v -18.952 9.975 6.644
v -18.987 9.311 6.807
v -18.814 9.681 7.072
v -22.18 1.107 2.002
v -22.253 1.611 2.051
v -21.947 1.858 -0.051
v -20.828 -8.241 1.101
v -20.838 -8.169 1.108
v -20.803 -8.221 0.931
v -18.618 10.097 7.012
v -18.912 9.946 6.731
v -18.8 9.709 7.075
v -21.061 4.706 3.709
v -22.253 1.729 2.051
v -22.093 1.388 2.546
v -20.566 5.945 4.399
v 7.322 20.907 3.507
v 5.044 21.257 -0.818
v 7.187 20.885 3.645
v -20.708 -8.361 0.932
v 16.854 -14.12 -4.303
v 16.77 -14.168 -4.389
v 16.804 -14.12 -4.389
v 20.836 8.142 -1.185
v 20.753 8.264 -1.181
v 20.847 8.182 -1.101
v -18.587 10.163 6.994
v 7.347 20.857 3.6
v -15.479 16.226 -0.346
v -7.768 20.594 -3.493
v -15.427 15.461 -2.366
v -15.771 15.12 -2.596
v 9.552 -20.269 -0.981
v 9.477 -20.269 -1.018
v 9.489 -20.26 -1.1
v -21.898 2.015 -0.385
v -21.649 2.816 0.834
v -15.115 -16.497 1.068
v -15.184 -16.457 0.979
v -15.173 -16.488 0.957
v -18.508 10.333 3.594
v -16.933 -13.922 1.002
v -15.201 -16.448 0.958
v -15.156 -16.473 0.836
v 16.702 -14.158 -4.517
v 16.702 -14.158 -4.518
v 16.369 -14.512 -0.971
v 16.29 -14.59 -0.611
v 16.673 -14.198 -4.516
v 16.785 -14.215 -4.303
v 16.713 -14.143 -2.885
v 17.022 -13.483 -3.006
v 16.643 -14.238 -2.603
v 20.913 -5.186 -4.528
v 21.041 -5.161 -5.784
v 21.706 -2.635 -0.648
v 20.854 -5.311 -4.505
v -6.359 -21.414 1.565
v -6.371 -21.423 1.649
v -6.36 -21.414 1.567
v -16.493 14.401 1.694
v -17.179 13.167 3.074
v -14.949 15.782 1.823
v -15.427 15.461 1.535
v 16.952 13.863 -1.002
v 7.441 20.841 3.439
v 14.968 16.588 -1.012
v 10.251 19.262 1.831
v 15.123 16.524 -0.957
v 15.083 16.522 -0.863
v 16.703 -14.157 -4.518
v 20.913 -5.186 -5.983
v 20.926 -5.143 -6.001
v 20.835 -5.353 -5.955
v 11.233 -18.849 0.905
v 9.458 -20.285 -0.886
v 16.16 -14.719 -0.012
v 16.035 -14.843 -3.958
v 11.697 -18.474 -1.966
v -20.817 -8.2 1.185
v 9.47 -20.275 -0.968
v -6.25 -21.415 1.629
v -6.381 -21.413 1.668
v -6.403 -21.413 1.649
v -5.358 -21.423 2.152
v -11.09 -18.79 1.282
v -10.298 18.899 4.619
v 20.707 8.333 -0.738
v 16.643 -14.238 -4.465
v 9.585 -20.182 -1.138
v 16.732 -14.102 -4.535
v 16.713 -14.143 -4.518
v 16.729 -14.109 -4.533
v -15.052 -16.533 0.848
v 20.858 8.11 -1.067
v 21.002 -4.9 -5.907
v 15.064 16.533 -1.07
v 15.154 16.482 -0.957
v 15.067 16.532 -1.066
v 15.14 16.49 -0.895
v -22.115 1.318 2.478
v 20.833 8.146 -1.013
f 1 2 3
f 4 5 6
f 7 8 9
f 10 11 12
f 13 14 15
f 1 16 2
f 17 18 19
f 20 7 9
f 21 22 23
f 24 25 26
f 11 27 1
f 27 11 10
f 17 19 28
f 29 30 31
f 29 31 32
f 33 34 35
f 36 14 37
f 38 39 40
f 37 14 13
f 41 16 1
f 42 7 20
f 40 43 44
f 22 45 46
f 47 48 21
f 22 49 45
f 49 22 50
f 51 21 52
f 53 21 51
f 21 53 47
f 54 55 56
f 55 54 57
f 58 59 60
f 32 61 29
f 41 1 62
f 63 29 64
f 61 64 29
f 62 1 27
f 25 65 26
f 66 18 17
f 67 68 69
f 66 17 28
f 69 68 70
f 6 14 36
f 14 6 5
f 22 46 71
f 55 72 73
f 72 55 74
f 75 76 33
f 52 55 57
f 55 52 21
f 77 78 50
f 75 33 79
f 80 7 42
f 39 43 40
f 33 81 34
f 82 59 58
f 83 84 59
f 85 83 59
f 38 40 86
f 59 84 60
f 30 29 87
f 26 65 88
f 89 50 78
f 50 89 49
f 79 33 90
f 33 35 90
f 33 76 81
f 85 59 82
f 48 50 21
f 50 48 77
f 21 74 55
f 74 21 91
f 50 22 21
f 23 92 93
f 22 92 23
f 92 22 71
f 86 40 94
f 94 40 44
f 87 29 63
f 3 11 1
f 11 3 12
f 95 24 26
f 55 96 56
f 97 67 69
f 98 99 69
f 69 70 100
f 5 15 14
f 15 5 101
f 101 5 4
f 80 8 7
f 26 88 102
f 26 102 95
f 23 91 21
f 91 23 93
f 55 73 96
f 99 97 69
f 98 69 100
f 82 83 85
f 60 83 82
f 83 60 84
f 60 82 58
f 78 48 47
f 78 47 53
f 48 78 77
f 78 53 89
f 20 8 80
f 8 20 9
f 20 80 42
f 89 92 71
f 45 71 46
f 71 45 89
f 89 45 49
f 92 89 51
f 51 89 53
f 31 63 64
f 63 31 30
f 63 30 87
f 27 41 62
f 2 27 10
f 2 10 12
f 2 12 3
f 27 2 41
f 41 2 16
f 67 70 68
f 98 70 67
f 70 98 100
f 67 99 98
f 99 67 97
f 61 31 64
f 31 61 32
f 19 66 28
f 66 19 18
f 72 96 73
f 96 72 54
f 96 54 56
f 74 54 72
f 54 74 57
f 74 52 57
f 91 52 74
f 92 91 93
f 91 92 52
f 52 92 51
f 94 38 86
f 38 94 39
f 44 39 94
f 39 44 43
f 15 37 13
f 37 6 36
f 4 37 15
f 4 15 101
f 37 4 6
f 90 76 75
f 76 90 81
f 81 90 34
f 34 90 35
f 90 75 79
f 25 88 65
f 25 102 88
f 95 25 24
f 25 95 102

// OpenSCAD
// Auto-generated OpenSCAD file

    inner_points = 10*[[-2.0761541235761705, -0.8104417535921696, 0.13724502428832586], [1.3881323190734756, 1.5113986256831482, 0.8802447594428363], [-1.5147673311324563, -1.6373143484753303, 0.10368044324004255], [1.9495191115171902, 0.6845260307999875, 0.846680178394553], [-1.9495191115171902, -0.6845260307999875, -0.846680178394553], [1.5147673311324563, 1.6373143484753303, -0.10368044324004255], [-1.3881323190734756, -1.5113986256831482, -0.8802447594428363], [2.0761541235761705, 0.8104417535921696, -0.13724502428832586], [-1.5234633524618937, 0.9319192053080169, 1.3403932206570697], [-0.7056562584656506, 1.480031367720886, 1.5157916654178742], [-0.3964274104829382, -0.954186159239866, 1.9795055087654227], [0.4213796835133048, -0.4060739968269973, 2.1549039535262273], [-1.170296744166604, 1.28307982057967, -1.40363089240515], [-0.35248965017036094, 1.831191982992539, -1.2282324476443454], [0.14000710893040944, -0.42079859805616315, -2.1884685345745107], [0.9578142029266525, 0.1273135643567057, -2.013070089813706], [-1.6612573602586815, 1.4143303177258313, 0.47535430243945176], [-0.8434502662624384, 1.9624424801387002, 0.6507527472002564], [-0.6469132683711399, -2.131768469941571, 0.15209993842251773], [1.5346223481997008, -1.5402460405180134, 0.5085709002434271], [-1.5346223481997008, 1.5402460405180134, -0.5085709002434271], [-0.7168152542034577, 2.0883582029308823, -0.3331724554826224], [-0.5202782563121594, -2.005852747149389, -0.8318252642603612], [1.6612573602586815, -1.4143303177258313, -0.47535430243945176], [-2.2142917828860567, 0.0908460622564875, -0.27336216035795285], [0.7445620794331305, 2.073934495513449, 0.3612353743605092], [0.9410990773244287, -2.020276454566821, -0.13741743441722942], [2.2142917828860567, -0.0908460622564875, 0.27336216035795285], [-1.2996082730590448, -0.9452718178121089, 1.550337867868314], [0.8414384952638997, 0.4897044530319842, 2.009536957825971], [-0.8414384952638997, -0.4897044530319842, -2.009536957825971], [1.2996082730590448, 0.9452718178121089, -1.550337867868314], [-0.48214483057590074, 0.02171704803160296, 2.1801680462004573], [0.8497908650802382, -1.6606523973205198, 1.2272559139802832], [0.07592153139657254, 0.5766135824990164, -2.1558804871902892], [1.1813256308164024, -1.3310007553325773, -1.3486937090311228], [-1.9431785126993897, -0.3827359479818073, 1.0313284827859868], [0.7033008359540129, 1.390992268880641, 1.5989297731796923], [-1.0348356016901774, -1.7206439108685836, 0.9770198498317137], [1.6116437469632254, 0.05308430599386482, 1.5446211402254193], [-1.6116437469632254, -0.05308430599386482, -1.5446211402254193], [1.0348356016901774, 1.7206439108685836, -0.9770198498317137], [-0.7033008359540129, -1.390992268880641, -1.5989297731796923], [1.9431785126993897, 0.3827359479818073, -1.0313284827859868], [-1.385325693152007, 0.03063138945936017, 1.7510004053033483], [-0.06208601882530573, 0.9174954978905845, 2.034801050500201], [-0.13165473911407088, -1.7295582522963406, 1.4061874907288225], [1.1915849352126302, -0.8426941438651167, 1.6899881359256754], [-0.9055240727977366, 0.5077077275231954, -1.97694891044175], [0.4177156015289647, 1.3945718359544197, -1.693148265244897], [0.278144768240296, -1.32208641390482, -1.7778613499282319], [1.6013844425669974, -0.43522230547359575, -1.494060704731379], [-2.0813161720092763, 0.5185518678668495, 0.6207212981397079], [0.05973059631366806, 1.9535281387109422, 1.0799203880973653], [0.25626759420496636, -2.140682811369328, 0.5812675793196267], [1.8764164183320928, -0.7222877870626099, 0.9713031221888193], [-1.8764164183320928, 0.7222877870626099, -0.9713031221888193], [0.2646303499908518, 2.1572640579067026, -0.5121040322311619], [0.46116734788214997, -1.9369468921735673, -1.0107568410089005], [2.0813161720092763, -0.5185518678668495, -0.6207212981397079]];

    outer_points = 10*[[-0.4268823140701343, -0.9336759799671088, 1.9829494778905428], [1.044314103840851, 1.7142316985032462, -0.9782053536275224], [-0.14875493293223763, -1.7142316985032462, 1.4231477896813076], [1.3224414849787478, 0.9336759799671088, -1.5380070418367575], [-1.3224414849787478, -0.9336759799671088, 1.5380070418367575], [0.14875493293223763, 1.7142316985032462, -1.4231477896813076], [-1.044314103840851, -1.7142316985032462, 0.9782053536275224], [0.4268823140701343, 0.9336759799671088, -1.9829494778905428], [0.6104399772973251, 0.9916253074667056, 1.9052848241689724], [0.9577423401785069, 1.6167115177293658, 1.2062509920287723], [1.8622372720494769, -0.7028209643993987, 1.0120192745645764], [2.2095396349306586, -0.07773475413673858, 0.3129854424243763], [-1.887144140831298, 0.9916253074667056, 0.6644051616426931], [-1.5398417779501163, 1.6167115177293658, -0.03462867049750695], [-1.931412253792762, -0.7028209643993987, -0.8727871306336115], [-1.5841098909115803, -0.07773475413673858, -1.5718209627738116], [-0.3149548424383457, 1.340700436841305, 1.757667136683724], [0.032347520442836064, 1.9657866471039651, 1.058633304543524], [0.25532809774881876, -2.1328349056634375, 0.6098285047317775], [1.2105140133469592, -1.340700436841305, -1.3127247006299387], [-1.2105140133469592, 1.340700436841305, 1.3127247006299387], [-0.8632116504657774, 1.9657866471039651, 0.6136908684897385], [-0.6402310731597947, -2.1328349056634375, 0.16488606867799224], [0.3149548424383457, -1.340700436841305, -1.757667136683724], [-0.9923493451491374, -0.10903087669423184, 1.9973540053303405], [0.26420240812812773, 2.1525522779349355, -0.531774158638992], [0.4871829854341103, -1.9460692748324666, -0.9805789584507381], [0.9923493451491374, 0.10903087669423184, -1.9973540053303405], [1.1654570644439781, -0.8182484721832537, 1.7199555942544524], [2.0747064548400616, 0.8182484721832537, -0.11013873757468051], [-2.0747064548400616, -0.8182484721832537, 0.11013873757468051], [-1.1654570644439781, 0.8182484721832537, -1.7199555942544524], [1.872687215981827, 0.28240771197768405, 1.1829439770392984], [1.6754393332671662, -1.4120385598884204, -0.4302535571372985], [-2.0739420796136083, 0.28240771197768405, -0.7778676700591818], [-0.6691650151082599, -1.4120385598884204, -1.5951279777632852], [0.3853453687312546, -0.37992789275156413, 2.166386789242983], [1.5092394237610585, 1.6428935754561307, -0.09573421013488248], [0.8353649246143677, -1.6428935754561307, 1.2606086307608693], [1.9592589796441717, 0.37992789275156413, -1.0015123686169962], [-1.9592589796441717, -0.37992789275156413, 1.0015123686169962], [-0.8353649246143677, 1.6428935754561307, -1.2606086307608693], [-1.5092394237610585, -1.6428935754561307, 0.09573421013488248], [-0.3853453687312546, 0.37992789275156413, -2.166386789242983], [1.1759070083763283, 0.16698020419382897, 1.8908802967291745], [1.7378540358912302, 1.1783909382976763, 0.7598197970402418], [1.5321451322198667, -1.5274660676722758, 0.5526723110709932], [2.0940921597347684, -0.5160553335684283, -0.5783881886179393], [-2.2172362806609085, 0.16698020419382897, 0.20505819814910997], [-1.6552892531460064, 1.1783909382976763, -0.9260023015398227], [-1.3659452227137587, -1.5274660676722758, -0.8871916580734094], [-0.8039981951988568, -0.5160553335684283, -2.018252157762342], [-0.1801216623477485, 0.44471721052131286, 2.1807913166827806], [0.729127728048335, 2.08121415488782, 0.3506969848536479], [0.9521083053543176, -2.017407397879582, -0.09810781495809817], [1.6291668398145611, -0.44471721052131286, -1.4608593321105792], [-1.6291668398145611, 0.44471721052131286, 1.4608593321105792], [-0.7199174494184777, 2.08121415488782, -0.3692349997185534], [-0.49693687211249515, -2.017407397879582, -0.8180397995302995], [0.1801216623477485, -0.44471721052131286, -2.1807913166827806]];

    // Convex hull for inner set (I)
    module inner_hull() {
        hull() {
            for (p = inner_points) {
                translate(p) sphere(r=0.1);
            }
        }
    }

    // Convex hull for outer set (O) minus inner hull (O \ I)
    module outer_minus_inner() {
        difference() {
            hull() {
                for (p = outer_points) {
                    translate(p) sphere(r=0.1);
                }
            }
            inner_hull(); // Subtract inner hull
        }
    }

    // Convex hull for outer set (O) minus all translated inner hulls
    module outer_minus_AllTranslationInner() {
        difference() {
            hull() {
                for (p = outer_points) {
                    translate(p) sphere(r=0.1);
                }
            }
            hull() {
                translate([0,0,50]) inner_hull();
                translate([0,0,-50]) inner_hull();
            }; // Subtract translated inner hulls
        }
    }

    // Difference between outer_minus_inner and outer_minus_AllTranslationInner
    module outer_minus_inner_diff() {
        difference() {
            // Outer minus inner
            difference() {
                hull() {
                    for (p = outer_points) {
                        translate(p) sphere(r=0.1);
                    }
                }
                inner_hull();
            }

            // Subtract Outer minus AllTranslationInner
            difference() {
                hull() {
                    for (p = outer_points) {
                        translate(p) sphere(r=0.1);
                    }
                }
                hull() {
                    translate([0,0,50]) inner_hull();
                    translate([0,0,-50]) inner_hull();
                };
            }
        }
    }

    // Rendering all with colors applied
    color([0, 1, 0, 1]) outer_minus_AllTranslationInner(); // Opaque green
    
